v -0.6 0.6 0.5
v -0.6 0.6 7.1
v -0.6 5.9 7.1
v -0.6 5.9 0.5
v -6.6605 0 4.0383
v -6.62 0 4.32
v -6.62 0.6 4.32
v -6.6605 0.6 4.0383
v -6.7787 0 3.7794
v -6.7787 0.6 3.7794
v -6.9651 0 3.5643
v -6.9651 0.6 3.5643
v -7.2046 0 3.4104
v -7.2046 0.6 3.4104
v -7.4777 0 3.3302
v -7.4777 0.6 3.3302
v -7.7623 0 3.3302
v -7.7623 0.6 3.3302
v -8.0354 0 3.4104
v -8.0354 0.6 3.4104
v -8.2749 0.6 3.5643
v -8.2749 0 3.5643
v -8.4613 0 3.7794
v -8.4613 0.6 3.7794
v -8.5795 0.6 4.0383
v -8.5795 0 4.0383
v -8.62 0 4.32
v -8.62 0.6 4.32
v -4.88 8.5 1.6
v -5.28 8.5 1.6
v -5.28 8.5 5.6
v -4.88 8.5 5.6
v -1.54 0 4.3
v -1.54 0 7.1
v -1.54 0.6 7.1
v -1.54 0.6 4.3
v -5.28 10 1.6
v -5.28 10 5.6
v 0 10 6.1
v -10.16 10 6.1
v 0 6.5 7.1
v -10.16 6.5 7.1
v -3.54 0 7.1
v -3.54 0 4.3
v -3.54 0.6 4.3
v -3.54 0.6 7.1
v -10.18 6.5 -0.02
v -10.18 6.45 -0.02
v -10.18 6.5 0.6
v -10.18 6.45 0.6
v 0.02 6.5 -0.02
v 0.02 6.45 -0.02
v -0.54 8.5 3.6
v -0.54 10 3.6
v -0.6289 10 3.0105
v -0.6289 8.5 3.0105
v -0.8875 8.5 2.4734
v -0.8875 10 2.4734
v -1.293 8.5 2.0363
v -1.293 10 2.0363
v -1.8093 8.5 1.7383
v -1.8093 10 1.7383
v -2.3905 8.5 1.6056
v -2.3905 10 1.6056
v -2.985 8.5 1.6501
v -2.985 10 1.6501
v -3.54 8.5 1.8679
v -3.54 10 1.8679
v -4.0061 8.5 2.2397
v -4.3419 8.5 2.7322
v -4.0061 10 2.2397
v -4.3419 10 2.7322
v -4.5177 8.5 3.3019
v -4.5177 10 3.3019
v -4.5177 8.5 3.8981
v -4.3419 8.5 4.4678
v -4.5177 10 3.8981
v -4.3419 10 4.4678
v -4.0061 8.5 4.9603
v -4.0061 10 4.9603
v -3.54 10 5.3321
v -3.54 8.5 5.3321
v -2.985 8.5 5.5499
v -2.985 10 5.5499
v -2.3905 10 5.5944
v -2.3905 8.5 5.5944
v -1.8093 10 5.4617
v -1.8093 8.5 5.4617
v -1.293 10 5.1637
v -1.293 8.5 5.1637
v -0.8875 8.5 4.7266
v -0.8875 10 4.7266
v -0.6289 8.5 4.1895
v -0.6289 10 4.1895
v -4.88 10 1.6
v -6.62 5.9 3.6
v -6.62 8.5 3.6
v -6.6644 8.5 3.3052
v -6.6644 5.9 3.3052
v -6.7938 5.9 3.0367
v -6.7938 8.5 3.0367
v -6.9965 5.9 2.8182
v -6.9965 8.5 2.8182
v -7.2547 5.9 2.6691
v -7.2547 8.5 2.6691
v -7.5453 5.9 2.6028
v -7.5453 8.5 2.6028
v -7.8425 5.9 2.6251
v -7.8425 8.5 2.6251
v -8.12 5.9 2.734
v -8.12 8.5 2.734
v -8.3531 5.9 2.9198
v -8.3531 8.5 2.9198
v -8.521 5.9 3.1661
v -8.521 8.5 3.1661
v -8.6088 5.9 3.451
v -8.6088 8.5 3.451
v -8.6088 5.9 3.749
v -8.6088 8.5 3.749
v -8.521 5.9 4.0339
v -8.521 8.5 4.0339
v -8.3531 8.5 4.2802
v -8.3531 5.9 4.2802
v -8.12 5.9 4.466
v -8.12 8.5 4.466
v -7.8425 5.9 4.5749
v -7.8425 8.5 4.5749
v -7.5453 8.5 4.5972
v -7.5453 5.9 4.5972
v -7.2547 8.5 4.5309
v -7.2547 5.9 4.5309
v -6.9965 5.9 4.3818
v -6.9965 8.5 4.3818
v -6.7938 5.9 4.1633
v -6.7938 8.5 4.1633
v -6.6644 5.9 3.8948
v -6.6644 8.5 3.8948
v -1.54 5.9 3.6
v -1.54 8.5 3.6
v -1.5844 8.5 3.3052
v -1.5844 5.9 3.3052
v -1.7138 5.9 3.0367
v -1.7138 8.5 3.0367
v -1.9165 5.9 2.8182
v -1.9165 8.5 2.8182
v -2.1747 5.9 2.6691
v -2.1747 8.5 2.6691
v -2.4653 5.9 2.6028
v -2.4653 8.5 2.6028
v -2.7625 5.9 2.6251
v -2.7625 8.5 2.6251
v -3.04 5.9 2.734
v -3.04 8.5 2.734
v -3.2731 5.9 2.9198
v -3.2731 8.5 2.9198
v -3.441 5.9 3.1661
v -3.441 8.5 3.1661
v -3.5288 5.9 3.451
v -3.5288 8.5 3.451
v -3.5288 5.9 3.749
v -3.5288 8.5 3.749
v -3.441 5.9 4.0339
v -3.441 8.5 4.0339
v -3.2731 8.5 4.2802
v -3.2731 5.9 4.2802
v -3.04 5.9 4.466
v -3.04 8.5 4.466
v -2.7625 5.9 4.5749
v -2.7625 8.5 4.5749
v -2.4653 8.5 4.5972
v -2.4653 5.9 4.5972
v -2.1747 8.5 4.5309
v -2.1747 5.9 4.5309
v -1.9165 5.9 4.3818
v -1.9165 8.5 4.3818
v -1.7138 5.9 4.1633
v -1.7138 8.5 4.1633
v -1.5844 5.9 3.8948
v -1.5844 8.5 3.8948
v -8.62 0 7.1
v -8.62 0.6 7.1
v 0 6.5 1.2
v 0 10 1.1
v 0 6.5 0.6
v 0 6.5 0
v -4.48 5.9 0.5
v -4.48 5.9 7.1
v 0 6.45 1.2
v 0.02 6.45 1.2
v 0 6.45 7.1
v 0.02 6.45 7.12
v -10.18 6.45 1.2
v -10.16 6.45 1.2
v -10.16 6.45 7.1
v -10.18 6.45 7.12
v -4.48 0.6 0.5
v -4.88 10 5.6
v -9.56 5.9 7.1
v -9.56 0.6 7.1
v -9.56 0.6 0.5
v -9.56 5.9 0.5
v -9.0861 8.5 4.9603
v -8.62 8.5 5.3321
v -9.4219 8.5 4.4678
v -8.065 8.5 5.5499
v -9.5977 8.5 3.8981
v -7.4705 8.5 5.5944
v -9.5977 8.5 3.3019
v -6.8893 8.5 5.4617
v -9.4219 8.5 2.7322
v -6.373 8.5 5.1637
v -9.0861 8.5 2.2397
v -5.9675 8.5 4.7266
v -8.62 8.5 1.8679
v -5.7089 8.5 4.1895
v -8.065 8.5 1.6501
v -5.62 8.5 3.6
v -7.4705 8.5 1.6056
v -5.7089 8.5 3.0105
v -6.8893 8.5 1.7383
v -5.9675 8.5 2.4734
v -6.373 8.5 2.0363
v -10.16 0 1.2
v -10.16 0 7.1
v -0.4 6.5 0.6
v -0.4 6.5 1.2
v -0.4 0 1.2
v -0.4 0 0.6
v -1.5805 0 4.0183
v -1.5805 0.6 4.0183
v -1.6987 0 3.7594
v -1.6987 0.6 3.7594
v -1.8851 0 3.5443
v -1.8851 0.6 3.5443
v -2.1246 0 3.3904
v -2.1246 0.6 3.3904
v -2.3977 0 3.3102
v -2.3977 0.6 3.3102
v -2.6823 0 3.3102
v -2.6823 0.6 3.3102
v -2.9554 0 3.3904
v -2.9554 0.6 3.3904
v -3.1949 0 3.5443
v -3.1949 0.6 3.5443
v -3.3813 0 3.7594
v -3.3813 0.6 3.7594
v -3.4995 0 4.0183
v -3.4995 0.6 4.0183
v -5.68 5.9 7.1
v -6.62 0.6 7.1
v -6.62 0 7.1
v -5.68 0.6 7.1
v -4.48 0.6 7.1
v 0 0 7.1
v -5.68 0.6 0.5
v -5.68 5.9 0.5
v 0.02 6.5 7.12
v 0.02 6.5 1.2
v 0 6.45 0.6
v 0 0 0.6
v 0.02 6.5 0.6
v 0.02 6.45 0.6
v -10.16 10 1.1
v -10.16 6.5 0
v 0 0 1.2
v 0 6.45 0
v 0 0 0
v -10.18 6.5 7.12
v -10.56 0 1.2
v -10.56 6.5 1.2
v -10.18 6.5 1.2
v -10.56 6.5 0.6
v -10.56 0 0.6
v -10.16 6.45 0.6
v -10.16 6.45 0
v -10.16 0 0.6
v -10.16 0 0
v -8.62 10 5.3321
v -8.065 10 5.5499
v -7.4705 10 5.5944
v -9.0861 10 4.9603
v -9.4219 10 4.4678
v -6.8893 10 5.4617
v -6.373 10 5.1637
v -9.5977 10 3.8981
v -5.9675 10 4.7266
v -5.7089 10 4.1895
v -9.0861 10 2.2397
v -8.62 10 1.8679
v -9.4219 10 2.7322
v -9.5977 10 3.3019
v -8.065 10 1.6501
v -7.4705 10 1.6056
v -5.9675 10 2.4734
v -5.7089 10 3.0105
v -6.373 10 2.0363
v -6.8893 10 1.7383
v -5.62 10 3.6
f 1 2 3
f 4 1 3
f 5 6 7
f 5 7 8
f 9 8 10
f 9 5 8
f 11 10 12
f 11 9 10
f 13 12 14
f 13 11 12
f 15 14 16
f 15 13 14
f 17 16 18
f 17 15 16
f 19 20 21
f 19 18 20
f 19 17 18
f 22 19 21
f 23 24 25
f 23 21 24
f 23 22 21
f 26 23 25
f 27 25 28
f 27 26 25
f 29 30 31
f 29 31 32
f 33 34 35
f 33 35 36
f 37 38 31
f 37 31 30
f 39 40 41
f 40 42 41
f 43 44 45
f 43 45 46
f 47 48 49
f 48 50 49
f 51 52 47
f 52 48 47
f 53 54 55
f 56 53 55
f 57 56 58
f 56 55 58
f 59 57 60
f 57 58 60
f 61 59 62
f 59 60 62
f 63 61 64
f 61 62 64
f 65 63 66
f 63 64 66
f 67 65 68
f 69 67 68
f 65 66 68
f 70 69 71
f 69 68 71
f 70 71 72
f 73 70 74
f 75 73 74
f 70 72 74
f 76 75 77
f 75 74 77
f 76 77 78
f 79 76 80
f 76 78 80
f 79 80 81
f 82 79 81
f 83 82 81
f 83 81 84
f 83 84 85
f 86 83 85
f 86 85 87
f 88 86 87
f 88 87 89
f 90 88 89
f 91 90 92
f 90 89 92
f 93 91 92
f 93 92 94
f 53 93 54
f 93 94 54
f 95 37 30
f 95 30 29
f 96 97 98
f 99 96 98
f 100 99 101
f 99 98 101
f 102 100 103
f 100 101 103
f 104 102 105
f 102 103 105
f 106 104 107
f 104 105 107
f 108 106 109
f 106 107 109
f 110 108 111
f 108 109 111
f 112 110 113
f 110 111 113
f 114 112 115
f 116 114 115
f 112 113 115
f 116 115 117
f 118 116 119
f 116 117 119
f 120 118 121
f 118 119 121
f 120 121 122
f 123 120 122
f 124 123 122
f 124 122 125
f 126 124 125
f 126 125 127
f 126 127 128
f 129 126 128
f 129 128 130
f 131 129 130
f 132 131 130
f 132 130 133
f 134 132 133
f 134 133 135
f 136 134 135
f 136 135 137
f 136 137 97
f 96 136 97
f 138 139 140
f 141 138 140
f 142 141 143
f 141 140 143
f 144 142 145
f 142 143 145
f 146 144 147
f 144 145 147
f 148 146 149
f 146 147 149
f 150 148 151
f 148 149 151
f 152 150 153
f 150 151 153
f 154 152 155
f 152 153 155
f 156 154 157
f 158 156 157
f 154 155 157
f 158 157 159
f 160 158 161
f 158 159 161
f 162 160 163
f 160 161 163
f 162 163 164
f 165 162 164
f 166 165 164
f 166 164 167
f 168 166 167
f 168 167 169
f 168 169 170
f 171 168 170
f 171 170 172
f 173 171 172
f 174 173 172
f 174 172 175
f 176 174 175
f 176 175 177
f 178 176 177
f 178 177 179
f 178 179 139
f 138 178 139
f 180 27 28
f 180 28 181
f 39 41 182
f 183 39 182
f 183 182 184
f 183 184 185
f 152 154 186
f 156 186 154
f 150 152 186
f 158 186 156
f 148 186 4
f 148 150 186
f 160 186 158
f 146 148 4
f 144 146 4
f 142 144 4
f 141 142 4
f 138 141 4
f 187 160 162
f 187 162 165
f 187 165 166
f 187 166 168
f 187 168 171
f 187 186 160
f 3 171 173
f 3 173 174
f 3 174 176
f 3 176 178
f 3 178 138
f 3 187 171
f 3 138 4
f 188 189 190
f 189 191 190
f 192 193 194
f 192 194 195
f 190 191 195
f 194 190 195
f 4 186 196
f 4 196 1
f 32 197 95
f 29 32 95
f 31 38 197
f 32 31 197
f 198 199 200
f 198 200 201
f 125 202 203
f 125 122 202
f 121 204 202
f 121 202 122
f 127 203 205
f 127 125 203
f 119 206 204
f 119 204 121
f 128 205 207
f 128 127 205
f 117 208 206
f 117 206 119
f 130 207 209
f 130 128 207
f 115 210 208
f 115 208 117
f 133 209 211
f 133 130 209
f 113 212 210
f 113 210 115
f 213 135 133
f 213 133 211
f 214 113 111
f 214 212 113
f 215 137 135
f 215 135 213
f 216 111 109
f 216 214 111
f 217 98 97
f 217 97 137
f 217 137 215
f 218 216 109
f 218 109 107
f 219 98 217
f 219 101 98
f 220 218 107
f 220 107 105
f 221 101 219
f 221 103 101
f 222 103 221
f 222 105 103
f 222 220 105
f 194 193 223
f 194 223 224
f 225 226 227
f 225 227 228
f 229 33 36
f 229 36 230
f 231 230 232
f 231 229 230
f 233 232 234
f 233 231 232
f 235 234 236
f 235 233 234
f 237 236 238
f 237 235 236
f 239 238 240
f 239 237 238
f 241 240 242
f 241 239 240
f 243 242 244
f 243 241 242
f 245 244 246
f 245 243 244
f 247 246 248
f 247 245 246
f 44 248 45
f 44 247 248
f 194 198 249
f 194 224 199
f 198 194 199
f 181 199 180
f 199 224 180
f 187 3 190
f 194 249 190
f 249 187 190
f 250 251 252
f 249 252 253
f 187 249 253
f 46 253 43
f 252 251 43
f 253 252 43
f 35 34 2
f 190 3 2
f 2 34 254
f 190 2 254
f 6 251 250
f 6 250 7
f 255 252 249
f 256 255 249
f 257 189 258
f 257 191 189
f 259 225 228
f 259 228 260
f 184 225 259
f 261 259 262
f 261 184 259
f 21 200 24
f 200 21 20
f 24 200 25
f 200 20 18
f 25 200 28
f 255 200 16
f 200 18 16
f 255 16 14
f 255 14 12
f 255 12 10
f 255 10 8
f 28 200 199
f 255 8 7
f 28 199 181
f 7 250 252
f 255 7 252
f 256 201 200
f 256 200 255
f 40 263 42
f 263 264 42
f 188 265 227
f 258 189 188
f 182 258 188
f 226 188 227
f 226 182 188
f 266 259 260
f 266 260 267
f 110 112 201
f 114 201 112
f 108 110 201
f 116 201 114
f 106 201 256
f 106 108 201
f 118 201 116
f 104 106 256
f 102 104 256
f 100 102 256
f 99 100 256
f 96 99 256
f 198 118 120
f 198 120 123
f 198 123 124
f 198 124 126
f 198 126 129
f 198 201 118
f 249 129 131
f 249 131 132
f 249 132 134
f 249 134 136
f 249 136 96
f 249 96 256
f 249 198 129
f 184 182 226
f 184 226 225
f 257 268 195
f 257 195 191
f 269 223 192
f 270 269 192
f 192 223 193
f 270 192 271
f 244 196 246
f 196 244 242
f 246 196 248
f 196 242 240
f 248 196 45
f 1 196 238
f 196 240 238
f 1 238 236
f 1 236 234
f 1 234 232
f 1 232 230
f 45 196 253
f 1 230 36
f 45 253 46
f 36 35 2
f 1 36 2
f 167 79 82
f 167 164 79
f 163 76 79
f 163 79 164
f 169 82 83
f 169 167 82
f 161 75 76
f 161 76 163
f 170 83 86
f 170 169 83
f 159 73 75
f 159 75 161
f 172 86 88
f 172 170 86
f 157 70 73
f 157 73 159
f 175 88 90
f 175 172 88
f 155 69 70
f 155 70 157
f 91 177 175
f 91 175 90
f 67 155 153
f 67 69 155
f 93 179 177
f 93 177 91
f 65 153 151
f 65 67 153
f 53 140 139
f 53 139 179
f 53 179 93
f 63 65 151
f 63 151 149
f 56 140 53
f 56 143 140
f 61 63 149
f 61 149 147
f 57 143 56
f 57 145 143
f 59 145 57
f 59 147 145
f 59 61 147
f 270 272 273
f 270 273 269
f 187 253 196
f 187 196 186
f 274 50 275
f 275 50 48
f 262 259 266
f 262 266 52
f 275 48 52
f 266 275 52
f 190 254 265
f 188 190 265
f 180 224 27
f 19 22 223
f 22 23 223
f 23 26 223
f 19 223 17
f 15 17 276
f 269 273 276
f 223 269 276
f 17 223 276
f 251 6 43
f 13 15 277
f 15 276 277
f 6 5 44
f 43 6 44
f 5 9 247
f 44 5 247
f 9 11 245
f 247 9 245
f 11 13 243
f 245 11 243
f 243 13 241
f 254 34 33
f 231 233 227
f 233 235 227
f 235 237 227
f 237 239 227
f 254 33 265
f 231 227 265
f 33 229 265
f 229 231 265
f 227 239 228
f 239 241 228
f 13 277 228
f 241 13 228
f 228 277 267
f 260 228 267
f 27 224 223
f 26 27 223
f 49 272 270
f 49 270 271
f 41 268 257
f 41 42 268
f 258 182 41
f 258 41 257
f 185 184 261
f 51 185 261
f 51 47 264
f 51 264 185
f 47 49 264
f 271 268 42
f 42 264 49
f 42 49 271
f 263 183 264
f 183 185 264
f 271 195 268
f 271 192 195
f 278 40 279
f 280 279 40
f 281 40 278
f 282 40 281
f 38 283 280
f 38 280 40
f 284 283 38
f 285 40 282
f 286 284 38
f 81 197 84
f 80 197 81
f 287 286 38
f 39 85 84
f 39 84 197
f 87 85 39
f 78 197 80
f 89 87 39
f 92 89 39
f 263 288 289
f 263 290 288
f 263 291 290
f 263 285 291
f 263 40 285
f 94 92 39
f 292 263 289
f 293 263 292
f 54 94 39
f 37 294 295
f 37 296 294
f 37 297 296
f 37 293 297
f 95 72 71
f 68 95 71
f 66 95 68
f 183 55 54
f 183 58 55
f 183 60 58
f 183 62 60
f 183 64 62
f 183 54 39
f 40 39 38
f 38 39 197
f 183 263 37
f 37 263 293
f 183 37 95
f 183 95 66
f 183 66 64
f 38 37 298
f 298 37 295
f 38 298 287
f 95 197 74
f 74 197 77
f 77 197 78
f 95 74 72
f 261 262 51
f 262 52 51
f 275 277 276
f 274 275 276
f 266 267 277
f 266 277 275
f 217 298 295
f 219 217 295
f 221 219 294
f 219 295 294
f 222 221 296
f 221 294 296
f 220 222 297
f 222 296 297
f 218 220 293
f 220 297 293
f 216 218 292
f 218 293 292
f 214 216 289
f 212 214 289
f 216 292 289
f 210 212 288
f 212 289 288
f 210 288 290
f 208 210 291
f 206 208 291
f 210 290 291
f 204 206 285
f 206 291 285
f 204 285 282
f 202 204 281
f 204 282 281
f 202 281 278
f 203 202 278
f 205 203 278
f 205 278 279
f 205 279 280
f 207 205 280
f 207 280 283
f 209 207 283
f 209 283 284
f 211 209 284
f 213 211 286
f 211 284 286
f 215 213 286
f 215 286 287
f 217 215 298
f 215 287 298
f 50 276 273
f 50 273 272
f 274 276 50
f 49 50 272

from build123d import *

# Parameters (mm, degrees)
SKETCH1_W            = 10.16
SKETCH1_H            = 7.1
BOSS_EXTRUDE1_DEPTH  = 6.5
SKETCH4_W            = 10.16
SKETCH4_H            = 5
SKETCH5_W            = 3.88
SKETCH5_H            = 5.3
CUT_EXTRUDE1_DEPTH   = 6.6
SKETCH6_R            = 2
SKETCH6_W            = 0.4
SKETCH6_H            = 4
CUT_EXTRUDE2_DEPTH   = 1.5
CUT_EXTRUDE3_REACH   = 10.5
SKETCH7_R            = 1
SKETCH8_W            = 0.6
SKETCH8_H            = 6.5
CUT_EXTRUDE4_DEPTH   = 0.4
SKETCH9_W            = 0.6
SKETCH9_H            = 6.5
BOSS_EXTRUDE2_DEPTH  = 0.4
SKETCH10_W           = 7.1
SKETCH10_H           = 0.05
BOSS_EXTRUDE3_DEPTH  = 0.02
SKETCH11_W           = 10.2
SKETCH11_H           = 0.05
BOSS_EXTRUDE4_DEPTH  = 0.02
SKETCH13_W           = 0.02
SKETCH13_H           = 0.05
BOSS_EXTRUDE8_DEPTH  = 5.9
SKETCH14_W           = 0.02
SKETCH14_H           = 0.05
BOSS_EXTRUDE9_DEPTH  = 0.02
SKETCH15_W           = 0.02
SKETCH15_H           = 0.05
BOSS_EXTRUDE10_DEPTH = 10.18
SKETCH16_W           = 0.02
SKETCH16_H           = 0.05
BOSS_EXTRUDE11_DEPTH = 0.6
CUT_EXTRUDE5_REACH   = 12


with BuildPart() as part:
    # Sketch1 → Boss-Extrude1 (new body)
    with BuildSketch(Plane(origin=(0, 0, 0), x_dir=(1, 0, 0), z_dir=(0, 1, 0))):
        with Locations((-5.08, -3.55)):
            Rectangle(SKETCH1_W, SKETCH1_H)
    extrude(amount=BOSS_EXTRUDE1_DEPTH)

    # Sketch4 → section 0 of loft1
    with BuildSketch(Plane(origin=(0, 10, 0), x_dir=(1, 0, 0), z_dir=(0, 1, 0)), mode=Mode.PRIVATE) as loft1_s0:
        with Locations((-5.08, -3.6)):
            Rectangle(SKETCH4_W, SKETCH4_H)
    # loft up to a face of the part (loft1)
    loft([loft1_s0.sketch, part.faces().sort_by_distance((-5.08, 6.5, 3.55))[0]])

    # Sketch5 → Cut-Extrude1 (cut)
    with BuildSketch(Plane.XY.offset(7.1)):
        with Locations((-7.62, 3.25)):
            Rectangle(SKETCH5_W, SKETCH5_H)
        with Locations((-2.54, 3.25)):
            Rectangle(SKETCH5_W, SKETCH5_H)
    extrude(amount=-CUT_EXTRUDE1_DEPTH, mode=Mode.SUBTRACT)

    # Sketch6 → Cut-Extrude2 (cut)
    with BuildSketch(Plane(origin=(0, 10, 0), x_dir=(1, 0, 0), z_dir=(0, 1, 0))):
        with Locations((-7.62, -3.6)):
            Circle(SKETCH6_R)
        with Locations((-2.54, -3.6)):
            Circle(SKETCH6_R)
        with Locations((-5.08, -3.6)):
            Rectangle(SKETCH6_W, SKETCH6_H)
    extrude(amount=-CUT_EXTRUDE2_DEPTH, mode=Mode.SUBTRACT)

    # Sketch7 → Cut-Extrude3 (cut, up to next)
    with BuildSketch(Plane(origin=(0, 8.5, 0), x_dir=(1, 0, 0), z_dir=(0, 1, 0)), mode=Mode.PRIVATE) as cut_extrude3_sk1:
        with Locations((-7.62, -3.6)):
            Circle(SKETCH7_R)
    cut_extrude3_tool1 = extrude(cut_extrude3_sk1.sketch, amount=-CUT_EXTRUDE3_REACH, mode=Mode.PRIVATE) & part.part
    add(cut_extrude3_tool1.solids().sort_by_distance((-7.62, 8.5, 3.6))[0], mode=Mode.SUBTRACT)
    # Sketch7 → Cut-Extrude3 (cut, up to next)
    with BuildSketch(Plane(origin=(0, 8.5, 0), x_dir=(1, 0, 0), z_dir=(0, 1, 0)), mode=Mode.PRIVATE) as cut_extrude3_sk2:
        with Locations((-2.54, -3.6)):
            Circle(SKETCH7_R)
    cut_extrude3_tool2 = extrude(cut_extrude3_sk2.sketch, amount=-CUT_EXTRUDE3_REACH, mode=Mode.PRIVATE) & part.part
    add(cut_extrude3_tool2.solids().sort_by_distance((-2.54, 8.5, 3.6))[0], mode=Mode.SUBTRACT)

    # Sketch8 → Cut-Extrude4 (cut)
    with BuildSketch(Plane(origin=(0, 0, 0), x_dir=(0, 0, -1), z_dir=(1, 0, 0))):
        with Locations((-0.9, 3.25)):
            Rectangle(SKETCH8_W, SKETCH8_H)
    extrude(amount=-CUT_EXTRUDE4_DEPTH, mode=Mode.SUBTRACT)

    # Sketch9 → Boss-Extrude2 (add)
    with BuildSketch(Plane.ZY.offset(10.16)):
        with Locations((0.9, 3.25)):
            Rectangle(SKETCH9_W, SKETCH9_H)
    extrude(amount=BOSS_EXTRUDE2_DEPTH)

    # Sketch10 → Boss-Extrude3 (add)
    with BuildSketch(Plane.ZY.offset(10.16)):
        with Locations((3.55, 6.475)):
            Rectangle(SKETCH10_W, SKETCH10_H)
    extrude(amount=BOSS_EXTRUDE3_DEPTH)

    # Sketch11 → Boss-Extrude4 (add)
    with BuildSketch(Plane.XY.offset(7.1)):
        with Locations((-5.08, 6.475)):
            Rectangle(SKETCH11_W, SKETCH11_H)
    extrude(amount=BOSS_EXTRUDE4_DEPTH)

    # Sketch13 → Boss-Extrude8 (add)
    with BuildSketch(Plane(origin=(0, 0, 7.1), x_dir=(-1, 0, 0), z_dir=(0, 0, -1))):
        with Locations((-0.01, 6.475)):
            Rectangle(SKETCH13_W, SKETCH13_H)
    extrude(amount=BOSS_EXTRUDE8_DEPTH)

    # Sketch14 → Boss-Extrude9 (add)
    with BuildSketch(Plane(origin=(0, 0, 0), x_dir=(-1, 0, 0), z_dir=(0, 0, -1))):
        with Locations((10.17, 6.475)):
            Rectangle(SKETCH14_W, SKETCH14_H)
    extrude(amount=BOSS_EXTRUDE9_DEPTH)

    # Sketch15 → Boss-Extrude10 (add)
    with BuildSketch(Plane(origin=(-10.16, 0, 0), x_dir=(0, 0, -1), z_dir=(1, 0, 0))):
        with Locations((0.01, 6.475)):
            Rectangle(SKETCH15_W, SKETCH15_H)
    extrude(amount=BOSS_EXTRUDE10_DEPTH)

    # Sketch16 → Boss-Extrude11 (add)
    with BuildSketch(Plane.XY):
        with Locations((0.01, 6.475)):
            Rectangle(SKETCH16_W, SKETCH16_H)
    extrude(amount=BOSS_EXTRUDE11_DEPTH)

    # Sketch18 → Cut-Extrude5 (cut, up to next)
    with BuildSketch(Plane.XZ, mode=Mode.PRIVATE) as cut_extrude5_sk1:
        with BuildLine():
            Line((-8.62, 4.32), (-8.62, 7.92))
            ThreePointArc((-8.62, 7.92), (-7.62, 8.92), (-6.62, 7.92))
            Line((-6.62, 7.92), (-6.62, 4.32))
            ThreePointArc((-6.62, 4.32), (-7.62, 3.32), (-8.62, 4.32))
        make_face()
    cut_extrude5_tool1 = extrude(cut_extrude5_sk1.sketch, amount=-CUT_EXTRUDE5_REACH, mode=Mode.PRIVATE) & part.part
    add(cut_extrude5_tool1.solids().sort_by_distance((-7.62, 0, 6.12))[0], mode=Mode.SUBTRACT)
    # Sketch18 → Cut-Extrude5 (cut, up to next)
    with BuildSketch(Plane.XZ, mode=Mode.PRIVATE) as cut_extrude5_sk2:
        with BuildLine():
            Line((-3.54, 4.3), (-3.54, 7.9))
            ThreePointArc((-3.54, 7.9), (-2.54, 8.9), (-1.54, 7.9))
            Line((-1.54, 7.9), (-1.54, 4.3))
            ThreePointArc((-1.54, 4.3), (-2.54, 3.3), (-3.54, 4.3))
        make_face()
    cut_extrude5_tool2 = extrude(cut_extrude5_sk2.sketch, amount=-CUT_EXTRUDE5_REACH, mode=Mode.PRIVATE) & part.part
    add(cut_extrude5_tool2.solids().sort_by_distance((-2.54, 0, 6.1))[0], mode=Mode.SUBTRACT)


solid = part.part
